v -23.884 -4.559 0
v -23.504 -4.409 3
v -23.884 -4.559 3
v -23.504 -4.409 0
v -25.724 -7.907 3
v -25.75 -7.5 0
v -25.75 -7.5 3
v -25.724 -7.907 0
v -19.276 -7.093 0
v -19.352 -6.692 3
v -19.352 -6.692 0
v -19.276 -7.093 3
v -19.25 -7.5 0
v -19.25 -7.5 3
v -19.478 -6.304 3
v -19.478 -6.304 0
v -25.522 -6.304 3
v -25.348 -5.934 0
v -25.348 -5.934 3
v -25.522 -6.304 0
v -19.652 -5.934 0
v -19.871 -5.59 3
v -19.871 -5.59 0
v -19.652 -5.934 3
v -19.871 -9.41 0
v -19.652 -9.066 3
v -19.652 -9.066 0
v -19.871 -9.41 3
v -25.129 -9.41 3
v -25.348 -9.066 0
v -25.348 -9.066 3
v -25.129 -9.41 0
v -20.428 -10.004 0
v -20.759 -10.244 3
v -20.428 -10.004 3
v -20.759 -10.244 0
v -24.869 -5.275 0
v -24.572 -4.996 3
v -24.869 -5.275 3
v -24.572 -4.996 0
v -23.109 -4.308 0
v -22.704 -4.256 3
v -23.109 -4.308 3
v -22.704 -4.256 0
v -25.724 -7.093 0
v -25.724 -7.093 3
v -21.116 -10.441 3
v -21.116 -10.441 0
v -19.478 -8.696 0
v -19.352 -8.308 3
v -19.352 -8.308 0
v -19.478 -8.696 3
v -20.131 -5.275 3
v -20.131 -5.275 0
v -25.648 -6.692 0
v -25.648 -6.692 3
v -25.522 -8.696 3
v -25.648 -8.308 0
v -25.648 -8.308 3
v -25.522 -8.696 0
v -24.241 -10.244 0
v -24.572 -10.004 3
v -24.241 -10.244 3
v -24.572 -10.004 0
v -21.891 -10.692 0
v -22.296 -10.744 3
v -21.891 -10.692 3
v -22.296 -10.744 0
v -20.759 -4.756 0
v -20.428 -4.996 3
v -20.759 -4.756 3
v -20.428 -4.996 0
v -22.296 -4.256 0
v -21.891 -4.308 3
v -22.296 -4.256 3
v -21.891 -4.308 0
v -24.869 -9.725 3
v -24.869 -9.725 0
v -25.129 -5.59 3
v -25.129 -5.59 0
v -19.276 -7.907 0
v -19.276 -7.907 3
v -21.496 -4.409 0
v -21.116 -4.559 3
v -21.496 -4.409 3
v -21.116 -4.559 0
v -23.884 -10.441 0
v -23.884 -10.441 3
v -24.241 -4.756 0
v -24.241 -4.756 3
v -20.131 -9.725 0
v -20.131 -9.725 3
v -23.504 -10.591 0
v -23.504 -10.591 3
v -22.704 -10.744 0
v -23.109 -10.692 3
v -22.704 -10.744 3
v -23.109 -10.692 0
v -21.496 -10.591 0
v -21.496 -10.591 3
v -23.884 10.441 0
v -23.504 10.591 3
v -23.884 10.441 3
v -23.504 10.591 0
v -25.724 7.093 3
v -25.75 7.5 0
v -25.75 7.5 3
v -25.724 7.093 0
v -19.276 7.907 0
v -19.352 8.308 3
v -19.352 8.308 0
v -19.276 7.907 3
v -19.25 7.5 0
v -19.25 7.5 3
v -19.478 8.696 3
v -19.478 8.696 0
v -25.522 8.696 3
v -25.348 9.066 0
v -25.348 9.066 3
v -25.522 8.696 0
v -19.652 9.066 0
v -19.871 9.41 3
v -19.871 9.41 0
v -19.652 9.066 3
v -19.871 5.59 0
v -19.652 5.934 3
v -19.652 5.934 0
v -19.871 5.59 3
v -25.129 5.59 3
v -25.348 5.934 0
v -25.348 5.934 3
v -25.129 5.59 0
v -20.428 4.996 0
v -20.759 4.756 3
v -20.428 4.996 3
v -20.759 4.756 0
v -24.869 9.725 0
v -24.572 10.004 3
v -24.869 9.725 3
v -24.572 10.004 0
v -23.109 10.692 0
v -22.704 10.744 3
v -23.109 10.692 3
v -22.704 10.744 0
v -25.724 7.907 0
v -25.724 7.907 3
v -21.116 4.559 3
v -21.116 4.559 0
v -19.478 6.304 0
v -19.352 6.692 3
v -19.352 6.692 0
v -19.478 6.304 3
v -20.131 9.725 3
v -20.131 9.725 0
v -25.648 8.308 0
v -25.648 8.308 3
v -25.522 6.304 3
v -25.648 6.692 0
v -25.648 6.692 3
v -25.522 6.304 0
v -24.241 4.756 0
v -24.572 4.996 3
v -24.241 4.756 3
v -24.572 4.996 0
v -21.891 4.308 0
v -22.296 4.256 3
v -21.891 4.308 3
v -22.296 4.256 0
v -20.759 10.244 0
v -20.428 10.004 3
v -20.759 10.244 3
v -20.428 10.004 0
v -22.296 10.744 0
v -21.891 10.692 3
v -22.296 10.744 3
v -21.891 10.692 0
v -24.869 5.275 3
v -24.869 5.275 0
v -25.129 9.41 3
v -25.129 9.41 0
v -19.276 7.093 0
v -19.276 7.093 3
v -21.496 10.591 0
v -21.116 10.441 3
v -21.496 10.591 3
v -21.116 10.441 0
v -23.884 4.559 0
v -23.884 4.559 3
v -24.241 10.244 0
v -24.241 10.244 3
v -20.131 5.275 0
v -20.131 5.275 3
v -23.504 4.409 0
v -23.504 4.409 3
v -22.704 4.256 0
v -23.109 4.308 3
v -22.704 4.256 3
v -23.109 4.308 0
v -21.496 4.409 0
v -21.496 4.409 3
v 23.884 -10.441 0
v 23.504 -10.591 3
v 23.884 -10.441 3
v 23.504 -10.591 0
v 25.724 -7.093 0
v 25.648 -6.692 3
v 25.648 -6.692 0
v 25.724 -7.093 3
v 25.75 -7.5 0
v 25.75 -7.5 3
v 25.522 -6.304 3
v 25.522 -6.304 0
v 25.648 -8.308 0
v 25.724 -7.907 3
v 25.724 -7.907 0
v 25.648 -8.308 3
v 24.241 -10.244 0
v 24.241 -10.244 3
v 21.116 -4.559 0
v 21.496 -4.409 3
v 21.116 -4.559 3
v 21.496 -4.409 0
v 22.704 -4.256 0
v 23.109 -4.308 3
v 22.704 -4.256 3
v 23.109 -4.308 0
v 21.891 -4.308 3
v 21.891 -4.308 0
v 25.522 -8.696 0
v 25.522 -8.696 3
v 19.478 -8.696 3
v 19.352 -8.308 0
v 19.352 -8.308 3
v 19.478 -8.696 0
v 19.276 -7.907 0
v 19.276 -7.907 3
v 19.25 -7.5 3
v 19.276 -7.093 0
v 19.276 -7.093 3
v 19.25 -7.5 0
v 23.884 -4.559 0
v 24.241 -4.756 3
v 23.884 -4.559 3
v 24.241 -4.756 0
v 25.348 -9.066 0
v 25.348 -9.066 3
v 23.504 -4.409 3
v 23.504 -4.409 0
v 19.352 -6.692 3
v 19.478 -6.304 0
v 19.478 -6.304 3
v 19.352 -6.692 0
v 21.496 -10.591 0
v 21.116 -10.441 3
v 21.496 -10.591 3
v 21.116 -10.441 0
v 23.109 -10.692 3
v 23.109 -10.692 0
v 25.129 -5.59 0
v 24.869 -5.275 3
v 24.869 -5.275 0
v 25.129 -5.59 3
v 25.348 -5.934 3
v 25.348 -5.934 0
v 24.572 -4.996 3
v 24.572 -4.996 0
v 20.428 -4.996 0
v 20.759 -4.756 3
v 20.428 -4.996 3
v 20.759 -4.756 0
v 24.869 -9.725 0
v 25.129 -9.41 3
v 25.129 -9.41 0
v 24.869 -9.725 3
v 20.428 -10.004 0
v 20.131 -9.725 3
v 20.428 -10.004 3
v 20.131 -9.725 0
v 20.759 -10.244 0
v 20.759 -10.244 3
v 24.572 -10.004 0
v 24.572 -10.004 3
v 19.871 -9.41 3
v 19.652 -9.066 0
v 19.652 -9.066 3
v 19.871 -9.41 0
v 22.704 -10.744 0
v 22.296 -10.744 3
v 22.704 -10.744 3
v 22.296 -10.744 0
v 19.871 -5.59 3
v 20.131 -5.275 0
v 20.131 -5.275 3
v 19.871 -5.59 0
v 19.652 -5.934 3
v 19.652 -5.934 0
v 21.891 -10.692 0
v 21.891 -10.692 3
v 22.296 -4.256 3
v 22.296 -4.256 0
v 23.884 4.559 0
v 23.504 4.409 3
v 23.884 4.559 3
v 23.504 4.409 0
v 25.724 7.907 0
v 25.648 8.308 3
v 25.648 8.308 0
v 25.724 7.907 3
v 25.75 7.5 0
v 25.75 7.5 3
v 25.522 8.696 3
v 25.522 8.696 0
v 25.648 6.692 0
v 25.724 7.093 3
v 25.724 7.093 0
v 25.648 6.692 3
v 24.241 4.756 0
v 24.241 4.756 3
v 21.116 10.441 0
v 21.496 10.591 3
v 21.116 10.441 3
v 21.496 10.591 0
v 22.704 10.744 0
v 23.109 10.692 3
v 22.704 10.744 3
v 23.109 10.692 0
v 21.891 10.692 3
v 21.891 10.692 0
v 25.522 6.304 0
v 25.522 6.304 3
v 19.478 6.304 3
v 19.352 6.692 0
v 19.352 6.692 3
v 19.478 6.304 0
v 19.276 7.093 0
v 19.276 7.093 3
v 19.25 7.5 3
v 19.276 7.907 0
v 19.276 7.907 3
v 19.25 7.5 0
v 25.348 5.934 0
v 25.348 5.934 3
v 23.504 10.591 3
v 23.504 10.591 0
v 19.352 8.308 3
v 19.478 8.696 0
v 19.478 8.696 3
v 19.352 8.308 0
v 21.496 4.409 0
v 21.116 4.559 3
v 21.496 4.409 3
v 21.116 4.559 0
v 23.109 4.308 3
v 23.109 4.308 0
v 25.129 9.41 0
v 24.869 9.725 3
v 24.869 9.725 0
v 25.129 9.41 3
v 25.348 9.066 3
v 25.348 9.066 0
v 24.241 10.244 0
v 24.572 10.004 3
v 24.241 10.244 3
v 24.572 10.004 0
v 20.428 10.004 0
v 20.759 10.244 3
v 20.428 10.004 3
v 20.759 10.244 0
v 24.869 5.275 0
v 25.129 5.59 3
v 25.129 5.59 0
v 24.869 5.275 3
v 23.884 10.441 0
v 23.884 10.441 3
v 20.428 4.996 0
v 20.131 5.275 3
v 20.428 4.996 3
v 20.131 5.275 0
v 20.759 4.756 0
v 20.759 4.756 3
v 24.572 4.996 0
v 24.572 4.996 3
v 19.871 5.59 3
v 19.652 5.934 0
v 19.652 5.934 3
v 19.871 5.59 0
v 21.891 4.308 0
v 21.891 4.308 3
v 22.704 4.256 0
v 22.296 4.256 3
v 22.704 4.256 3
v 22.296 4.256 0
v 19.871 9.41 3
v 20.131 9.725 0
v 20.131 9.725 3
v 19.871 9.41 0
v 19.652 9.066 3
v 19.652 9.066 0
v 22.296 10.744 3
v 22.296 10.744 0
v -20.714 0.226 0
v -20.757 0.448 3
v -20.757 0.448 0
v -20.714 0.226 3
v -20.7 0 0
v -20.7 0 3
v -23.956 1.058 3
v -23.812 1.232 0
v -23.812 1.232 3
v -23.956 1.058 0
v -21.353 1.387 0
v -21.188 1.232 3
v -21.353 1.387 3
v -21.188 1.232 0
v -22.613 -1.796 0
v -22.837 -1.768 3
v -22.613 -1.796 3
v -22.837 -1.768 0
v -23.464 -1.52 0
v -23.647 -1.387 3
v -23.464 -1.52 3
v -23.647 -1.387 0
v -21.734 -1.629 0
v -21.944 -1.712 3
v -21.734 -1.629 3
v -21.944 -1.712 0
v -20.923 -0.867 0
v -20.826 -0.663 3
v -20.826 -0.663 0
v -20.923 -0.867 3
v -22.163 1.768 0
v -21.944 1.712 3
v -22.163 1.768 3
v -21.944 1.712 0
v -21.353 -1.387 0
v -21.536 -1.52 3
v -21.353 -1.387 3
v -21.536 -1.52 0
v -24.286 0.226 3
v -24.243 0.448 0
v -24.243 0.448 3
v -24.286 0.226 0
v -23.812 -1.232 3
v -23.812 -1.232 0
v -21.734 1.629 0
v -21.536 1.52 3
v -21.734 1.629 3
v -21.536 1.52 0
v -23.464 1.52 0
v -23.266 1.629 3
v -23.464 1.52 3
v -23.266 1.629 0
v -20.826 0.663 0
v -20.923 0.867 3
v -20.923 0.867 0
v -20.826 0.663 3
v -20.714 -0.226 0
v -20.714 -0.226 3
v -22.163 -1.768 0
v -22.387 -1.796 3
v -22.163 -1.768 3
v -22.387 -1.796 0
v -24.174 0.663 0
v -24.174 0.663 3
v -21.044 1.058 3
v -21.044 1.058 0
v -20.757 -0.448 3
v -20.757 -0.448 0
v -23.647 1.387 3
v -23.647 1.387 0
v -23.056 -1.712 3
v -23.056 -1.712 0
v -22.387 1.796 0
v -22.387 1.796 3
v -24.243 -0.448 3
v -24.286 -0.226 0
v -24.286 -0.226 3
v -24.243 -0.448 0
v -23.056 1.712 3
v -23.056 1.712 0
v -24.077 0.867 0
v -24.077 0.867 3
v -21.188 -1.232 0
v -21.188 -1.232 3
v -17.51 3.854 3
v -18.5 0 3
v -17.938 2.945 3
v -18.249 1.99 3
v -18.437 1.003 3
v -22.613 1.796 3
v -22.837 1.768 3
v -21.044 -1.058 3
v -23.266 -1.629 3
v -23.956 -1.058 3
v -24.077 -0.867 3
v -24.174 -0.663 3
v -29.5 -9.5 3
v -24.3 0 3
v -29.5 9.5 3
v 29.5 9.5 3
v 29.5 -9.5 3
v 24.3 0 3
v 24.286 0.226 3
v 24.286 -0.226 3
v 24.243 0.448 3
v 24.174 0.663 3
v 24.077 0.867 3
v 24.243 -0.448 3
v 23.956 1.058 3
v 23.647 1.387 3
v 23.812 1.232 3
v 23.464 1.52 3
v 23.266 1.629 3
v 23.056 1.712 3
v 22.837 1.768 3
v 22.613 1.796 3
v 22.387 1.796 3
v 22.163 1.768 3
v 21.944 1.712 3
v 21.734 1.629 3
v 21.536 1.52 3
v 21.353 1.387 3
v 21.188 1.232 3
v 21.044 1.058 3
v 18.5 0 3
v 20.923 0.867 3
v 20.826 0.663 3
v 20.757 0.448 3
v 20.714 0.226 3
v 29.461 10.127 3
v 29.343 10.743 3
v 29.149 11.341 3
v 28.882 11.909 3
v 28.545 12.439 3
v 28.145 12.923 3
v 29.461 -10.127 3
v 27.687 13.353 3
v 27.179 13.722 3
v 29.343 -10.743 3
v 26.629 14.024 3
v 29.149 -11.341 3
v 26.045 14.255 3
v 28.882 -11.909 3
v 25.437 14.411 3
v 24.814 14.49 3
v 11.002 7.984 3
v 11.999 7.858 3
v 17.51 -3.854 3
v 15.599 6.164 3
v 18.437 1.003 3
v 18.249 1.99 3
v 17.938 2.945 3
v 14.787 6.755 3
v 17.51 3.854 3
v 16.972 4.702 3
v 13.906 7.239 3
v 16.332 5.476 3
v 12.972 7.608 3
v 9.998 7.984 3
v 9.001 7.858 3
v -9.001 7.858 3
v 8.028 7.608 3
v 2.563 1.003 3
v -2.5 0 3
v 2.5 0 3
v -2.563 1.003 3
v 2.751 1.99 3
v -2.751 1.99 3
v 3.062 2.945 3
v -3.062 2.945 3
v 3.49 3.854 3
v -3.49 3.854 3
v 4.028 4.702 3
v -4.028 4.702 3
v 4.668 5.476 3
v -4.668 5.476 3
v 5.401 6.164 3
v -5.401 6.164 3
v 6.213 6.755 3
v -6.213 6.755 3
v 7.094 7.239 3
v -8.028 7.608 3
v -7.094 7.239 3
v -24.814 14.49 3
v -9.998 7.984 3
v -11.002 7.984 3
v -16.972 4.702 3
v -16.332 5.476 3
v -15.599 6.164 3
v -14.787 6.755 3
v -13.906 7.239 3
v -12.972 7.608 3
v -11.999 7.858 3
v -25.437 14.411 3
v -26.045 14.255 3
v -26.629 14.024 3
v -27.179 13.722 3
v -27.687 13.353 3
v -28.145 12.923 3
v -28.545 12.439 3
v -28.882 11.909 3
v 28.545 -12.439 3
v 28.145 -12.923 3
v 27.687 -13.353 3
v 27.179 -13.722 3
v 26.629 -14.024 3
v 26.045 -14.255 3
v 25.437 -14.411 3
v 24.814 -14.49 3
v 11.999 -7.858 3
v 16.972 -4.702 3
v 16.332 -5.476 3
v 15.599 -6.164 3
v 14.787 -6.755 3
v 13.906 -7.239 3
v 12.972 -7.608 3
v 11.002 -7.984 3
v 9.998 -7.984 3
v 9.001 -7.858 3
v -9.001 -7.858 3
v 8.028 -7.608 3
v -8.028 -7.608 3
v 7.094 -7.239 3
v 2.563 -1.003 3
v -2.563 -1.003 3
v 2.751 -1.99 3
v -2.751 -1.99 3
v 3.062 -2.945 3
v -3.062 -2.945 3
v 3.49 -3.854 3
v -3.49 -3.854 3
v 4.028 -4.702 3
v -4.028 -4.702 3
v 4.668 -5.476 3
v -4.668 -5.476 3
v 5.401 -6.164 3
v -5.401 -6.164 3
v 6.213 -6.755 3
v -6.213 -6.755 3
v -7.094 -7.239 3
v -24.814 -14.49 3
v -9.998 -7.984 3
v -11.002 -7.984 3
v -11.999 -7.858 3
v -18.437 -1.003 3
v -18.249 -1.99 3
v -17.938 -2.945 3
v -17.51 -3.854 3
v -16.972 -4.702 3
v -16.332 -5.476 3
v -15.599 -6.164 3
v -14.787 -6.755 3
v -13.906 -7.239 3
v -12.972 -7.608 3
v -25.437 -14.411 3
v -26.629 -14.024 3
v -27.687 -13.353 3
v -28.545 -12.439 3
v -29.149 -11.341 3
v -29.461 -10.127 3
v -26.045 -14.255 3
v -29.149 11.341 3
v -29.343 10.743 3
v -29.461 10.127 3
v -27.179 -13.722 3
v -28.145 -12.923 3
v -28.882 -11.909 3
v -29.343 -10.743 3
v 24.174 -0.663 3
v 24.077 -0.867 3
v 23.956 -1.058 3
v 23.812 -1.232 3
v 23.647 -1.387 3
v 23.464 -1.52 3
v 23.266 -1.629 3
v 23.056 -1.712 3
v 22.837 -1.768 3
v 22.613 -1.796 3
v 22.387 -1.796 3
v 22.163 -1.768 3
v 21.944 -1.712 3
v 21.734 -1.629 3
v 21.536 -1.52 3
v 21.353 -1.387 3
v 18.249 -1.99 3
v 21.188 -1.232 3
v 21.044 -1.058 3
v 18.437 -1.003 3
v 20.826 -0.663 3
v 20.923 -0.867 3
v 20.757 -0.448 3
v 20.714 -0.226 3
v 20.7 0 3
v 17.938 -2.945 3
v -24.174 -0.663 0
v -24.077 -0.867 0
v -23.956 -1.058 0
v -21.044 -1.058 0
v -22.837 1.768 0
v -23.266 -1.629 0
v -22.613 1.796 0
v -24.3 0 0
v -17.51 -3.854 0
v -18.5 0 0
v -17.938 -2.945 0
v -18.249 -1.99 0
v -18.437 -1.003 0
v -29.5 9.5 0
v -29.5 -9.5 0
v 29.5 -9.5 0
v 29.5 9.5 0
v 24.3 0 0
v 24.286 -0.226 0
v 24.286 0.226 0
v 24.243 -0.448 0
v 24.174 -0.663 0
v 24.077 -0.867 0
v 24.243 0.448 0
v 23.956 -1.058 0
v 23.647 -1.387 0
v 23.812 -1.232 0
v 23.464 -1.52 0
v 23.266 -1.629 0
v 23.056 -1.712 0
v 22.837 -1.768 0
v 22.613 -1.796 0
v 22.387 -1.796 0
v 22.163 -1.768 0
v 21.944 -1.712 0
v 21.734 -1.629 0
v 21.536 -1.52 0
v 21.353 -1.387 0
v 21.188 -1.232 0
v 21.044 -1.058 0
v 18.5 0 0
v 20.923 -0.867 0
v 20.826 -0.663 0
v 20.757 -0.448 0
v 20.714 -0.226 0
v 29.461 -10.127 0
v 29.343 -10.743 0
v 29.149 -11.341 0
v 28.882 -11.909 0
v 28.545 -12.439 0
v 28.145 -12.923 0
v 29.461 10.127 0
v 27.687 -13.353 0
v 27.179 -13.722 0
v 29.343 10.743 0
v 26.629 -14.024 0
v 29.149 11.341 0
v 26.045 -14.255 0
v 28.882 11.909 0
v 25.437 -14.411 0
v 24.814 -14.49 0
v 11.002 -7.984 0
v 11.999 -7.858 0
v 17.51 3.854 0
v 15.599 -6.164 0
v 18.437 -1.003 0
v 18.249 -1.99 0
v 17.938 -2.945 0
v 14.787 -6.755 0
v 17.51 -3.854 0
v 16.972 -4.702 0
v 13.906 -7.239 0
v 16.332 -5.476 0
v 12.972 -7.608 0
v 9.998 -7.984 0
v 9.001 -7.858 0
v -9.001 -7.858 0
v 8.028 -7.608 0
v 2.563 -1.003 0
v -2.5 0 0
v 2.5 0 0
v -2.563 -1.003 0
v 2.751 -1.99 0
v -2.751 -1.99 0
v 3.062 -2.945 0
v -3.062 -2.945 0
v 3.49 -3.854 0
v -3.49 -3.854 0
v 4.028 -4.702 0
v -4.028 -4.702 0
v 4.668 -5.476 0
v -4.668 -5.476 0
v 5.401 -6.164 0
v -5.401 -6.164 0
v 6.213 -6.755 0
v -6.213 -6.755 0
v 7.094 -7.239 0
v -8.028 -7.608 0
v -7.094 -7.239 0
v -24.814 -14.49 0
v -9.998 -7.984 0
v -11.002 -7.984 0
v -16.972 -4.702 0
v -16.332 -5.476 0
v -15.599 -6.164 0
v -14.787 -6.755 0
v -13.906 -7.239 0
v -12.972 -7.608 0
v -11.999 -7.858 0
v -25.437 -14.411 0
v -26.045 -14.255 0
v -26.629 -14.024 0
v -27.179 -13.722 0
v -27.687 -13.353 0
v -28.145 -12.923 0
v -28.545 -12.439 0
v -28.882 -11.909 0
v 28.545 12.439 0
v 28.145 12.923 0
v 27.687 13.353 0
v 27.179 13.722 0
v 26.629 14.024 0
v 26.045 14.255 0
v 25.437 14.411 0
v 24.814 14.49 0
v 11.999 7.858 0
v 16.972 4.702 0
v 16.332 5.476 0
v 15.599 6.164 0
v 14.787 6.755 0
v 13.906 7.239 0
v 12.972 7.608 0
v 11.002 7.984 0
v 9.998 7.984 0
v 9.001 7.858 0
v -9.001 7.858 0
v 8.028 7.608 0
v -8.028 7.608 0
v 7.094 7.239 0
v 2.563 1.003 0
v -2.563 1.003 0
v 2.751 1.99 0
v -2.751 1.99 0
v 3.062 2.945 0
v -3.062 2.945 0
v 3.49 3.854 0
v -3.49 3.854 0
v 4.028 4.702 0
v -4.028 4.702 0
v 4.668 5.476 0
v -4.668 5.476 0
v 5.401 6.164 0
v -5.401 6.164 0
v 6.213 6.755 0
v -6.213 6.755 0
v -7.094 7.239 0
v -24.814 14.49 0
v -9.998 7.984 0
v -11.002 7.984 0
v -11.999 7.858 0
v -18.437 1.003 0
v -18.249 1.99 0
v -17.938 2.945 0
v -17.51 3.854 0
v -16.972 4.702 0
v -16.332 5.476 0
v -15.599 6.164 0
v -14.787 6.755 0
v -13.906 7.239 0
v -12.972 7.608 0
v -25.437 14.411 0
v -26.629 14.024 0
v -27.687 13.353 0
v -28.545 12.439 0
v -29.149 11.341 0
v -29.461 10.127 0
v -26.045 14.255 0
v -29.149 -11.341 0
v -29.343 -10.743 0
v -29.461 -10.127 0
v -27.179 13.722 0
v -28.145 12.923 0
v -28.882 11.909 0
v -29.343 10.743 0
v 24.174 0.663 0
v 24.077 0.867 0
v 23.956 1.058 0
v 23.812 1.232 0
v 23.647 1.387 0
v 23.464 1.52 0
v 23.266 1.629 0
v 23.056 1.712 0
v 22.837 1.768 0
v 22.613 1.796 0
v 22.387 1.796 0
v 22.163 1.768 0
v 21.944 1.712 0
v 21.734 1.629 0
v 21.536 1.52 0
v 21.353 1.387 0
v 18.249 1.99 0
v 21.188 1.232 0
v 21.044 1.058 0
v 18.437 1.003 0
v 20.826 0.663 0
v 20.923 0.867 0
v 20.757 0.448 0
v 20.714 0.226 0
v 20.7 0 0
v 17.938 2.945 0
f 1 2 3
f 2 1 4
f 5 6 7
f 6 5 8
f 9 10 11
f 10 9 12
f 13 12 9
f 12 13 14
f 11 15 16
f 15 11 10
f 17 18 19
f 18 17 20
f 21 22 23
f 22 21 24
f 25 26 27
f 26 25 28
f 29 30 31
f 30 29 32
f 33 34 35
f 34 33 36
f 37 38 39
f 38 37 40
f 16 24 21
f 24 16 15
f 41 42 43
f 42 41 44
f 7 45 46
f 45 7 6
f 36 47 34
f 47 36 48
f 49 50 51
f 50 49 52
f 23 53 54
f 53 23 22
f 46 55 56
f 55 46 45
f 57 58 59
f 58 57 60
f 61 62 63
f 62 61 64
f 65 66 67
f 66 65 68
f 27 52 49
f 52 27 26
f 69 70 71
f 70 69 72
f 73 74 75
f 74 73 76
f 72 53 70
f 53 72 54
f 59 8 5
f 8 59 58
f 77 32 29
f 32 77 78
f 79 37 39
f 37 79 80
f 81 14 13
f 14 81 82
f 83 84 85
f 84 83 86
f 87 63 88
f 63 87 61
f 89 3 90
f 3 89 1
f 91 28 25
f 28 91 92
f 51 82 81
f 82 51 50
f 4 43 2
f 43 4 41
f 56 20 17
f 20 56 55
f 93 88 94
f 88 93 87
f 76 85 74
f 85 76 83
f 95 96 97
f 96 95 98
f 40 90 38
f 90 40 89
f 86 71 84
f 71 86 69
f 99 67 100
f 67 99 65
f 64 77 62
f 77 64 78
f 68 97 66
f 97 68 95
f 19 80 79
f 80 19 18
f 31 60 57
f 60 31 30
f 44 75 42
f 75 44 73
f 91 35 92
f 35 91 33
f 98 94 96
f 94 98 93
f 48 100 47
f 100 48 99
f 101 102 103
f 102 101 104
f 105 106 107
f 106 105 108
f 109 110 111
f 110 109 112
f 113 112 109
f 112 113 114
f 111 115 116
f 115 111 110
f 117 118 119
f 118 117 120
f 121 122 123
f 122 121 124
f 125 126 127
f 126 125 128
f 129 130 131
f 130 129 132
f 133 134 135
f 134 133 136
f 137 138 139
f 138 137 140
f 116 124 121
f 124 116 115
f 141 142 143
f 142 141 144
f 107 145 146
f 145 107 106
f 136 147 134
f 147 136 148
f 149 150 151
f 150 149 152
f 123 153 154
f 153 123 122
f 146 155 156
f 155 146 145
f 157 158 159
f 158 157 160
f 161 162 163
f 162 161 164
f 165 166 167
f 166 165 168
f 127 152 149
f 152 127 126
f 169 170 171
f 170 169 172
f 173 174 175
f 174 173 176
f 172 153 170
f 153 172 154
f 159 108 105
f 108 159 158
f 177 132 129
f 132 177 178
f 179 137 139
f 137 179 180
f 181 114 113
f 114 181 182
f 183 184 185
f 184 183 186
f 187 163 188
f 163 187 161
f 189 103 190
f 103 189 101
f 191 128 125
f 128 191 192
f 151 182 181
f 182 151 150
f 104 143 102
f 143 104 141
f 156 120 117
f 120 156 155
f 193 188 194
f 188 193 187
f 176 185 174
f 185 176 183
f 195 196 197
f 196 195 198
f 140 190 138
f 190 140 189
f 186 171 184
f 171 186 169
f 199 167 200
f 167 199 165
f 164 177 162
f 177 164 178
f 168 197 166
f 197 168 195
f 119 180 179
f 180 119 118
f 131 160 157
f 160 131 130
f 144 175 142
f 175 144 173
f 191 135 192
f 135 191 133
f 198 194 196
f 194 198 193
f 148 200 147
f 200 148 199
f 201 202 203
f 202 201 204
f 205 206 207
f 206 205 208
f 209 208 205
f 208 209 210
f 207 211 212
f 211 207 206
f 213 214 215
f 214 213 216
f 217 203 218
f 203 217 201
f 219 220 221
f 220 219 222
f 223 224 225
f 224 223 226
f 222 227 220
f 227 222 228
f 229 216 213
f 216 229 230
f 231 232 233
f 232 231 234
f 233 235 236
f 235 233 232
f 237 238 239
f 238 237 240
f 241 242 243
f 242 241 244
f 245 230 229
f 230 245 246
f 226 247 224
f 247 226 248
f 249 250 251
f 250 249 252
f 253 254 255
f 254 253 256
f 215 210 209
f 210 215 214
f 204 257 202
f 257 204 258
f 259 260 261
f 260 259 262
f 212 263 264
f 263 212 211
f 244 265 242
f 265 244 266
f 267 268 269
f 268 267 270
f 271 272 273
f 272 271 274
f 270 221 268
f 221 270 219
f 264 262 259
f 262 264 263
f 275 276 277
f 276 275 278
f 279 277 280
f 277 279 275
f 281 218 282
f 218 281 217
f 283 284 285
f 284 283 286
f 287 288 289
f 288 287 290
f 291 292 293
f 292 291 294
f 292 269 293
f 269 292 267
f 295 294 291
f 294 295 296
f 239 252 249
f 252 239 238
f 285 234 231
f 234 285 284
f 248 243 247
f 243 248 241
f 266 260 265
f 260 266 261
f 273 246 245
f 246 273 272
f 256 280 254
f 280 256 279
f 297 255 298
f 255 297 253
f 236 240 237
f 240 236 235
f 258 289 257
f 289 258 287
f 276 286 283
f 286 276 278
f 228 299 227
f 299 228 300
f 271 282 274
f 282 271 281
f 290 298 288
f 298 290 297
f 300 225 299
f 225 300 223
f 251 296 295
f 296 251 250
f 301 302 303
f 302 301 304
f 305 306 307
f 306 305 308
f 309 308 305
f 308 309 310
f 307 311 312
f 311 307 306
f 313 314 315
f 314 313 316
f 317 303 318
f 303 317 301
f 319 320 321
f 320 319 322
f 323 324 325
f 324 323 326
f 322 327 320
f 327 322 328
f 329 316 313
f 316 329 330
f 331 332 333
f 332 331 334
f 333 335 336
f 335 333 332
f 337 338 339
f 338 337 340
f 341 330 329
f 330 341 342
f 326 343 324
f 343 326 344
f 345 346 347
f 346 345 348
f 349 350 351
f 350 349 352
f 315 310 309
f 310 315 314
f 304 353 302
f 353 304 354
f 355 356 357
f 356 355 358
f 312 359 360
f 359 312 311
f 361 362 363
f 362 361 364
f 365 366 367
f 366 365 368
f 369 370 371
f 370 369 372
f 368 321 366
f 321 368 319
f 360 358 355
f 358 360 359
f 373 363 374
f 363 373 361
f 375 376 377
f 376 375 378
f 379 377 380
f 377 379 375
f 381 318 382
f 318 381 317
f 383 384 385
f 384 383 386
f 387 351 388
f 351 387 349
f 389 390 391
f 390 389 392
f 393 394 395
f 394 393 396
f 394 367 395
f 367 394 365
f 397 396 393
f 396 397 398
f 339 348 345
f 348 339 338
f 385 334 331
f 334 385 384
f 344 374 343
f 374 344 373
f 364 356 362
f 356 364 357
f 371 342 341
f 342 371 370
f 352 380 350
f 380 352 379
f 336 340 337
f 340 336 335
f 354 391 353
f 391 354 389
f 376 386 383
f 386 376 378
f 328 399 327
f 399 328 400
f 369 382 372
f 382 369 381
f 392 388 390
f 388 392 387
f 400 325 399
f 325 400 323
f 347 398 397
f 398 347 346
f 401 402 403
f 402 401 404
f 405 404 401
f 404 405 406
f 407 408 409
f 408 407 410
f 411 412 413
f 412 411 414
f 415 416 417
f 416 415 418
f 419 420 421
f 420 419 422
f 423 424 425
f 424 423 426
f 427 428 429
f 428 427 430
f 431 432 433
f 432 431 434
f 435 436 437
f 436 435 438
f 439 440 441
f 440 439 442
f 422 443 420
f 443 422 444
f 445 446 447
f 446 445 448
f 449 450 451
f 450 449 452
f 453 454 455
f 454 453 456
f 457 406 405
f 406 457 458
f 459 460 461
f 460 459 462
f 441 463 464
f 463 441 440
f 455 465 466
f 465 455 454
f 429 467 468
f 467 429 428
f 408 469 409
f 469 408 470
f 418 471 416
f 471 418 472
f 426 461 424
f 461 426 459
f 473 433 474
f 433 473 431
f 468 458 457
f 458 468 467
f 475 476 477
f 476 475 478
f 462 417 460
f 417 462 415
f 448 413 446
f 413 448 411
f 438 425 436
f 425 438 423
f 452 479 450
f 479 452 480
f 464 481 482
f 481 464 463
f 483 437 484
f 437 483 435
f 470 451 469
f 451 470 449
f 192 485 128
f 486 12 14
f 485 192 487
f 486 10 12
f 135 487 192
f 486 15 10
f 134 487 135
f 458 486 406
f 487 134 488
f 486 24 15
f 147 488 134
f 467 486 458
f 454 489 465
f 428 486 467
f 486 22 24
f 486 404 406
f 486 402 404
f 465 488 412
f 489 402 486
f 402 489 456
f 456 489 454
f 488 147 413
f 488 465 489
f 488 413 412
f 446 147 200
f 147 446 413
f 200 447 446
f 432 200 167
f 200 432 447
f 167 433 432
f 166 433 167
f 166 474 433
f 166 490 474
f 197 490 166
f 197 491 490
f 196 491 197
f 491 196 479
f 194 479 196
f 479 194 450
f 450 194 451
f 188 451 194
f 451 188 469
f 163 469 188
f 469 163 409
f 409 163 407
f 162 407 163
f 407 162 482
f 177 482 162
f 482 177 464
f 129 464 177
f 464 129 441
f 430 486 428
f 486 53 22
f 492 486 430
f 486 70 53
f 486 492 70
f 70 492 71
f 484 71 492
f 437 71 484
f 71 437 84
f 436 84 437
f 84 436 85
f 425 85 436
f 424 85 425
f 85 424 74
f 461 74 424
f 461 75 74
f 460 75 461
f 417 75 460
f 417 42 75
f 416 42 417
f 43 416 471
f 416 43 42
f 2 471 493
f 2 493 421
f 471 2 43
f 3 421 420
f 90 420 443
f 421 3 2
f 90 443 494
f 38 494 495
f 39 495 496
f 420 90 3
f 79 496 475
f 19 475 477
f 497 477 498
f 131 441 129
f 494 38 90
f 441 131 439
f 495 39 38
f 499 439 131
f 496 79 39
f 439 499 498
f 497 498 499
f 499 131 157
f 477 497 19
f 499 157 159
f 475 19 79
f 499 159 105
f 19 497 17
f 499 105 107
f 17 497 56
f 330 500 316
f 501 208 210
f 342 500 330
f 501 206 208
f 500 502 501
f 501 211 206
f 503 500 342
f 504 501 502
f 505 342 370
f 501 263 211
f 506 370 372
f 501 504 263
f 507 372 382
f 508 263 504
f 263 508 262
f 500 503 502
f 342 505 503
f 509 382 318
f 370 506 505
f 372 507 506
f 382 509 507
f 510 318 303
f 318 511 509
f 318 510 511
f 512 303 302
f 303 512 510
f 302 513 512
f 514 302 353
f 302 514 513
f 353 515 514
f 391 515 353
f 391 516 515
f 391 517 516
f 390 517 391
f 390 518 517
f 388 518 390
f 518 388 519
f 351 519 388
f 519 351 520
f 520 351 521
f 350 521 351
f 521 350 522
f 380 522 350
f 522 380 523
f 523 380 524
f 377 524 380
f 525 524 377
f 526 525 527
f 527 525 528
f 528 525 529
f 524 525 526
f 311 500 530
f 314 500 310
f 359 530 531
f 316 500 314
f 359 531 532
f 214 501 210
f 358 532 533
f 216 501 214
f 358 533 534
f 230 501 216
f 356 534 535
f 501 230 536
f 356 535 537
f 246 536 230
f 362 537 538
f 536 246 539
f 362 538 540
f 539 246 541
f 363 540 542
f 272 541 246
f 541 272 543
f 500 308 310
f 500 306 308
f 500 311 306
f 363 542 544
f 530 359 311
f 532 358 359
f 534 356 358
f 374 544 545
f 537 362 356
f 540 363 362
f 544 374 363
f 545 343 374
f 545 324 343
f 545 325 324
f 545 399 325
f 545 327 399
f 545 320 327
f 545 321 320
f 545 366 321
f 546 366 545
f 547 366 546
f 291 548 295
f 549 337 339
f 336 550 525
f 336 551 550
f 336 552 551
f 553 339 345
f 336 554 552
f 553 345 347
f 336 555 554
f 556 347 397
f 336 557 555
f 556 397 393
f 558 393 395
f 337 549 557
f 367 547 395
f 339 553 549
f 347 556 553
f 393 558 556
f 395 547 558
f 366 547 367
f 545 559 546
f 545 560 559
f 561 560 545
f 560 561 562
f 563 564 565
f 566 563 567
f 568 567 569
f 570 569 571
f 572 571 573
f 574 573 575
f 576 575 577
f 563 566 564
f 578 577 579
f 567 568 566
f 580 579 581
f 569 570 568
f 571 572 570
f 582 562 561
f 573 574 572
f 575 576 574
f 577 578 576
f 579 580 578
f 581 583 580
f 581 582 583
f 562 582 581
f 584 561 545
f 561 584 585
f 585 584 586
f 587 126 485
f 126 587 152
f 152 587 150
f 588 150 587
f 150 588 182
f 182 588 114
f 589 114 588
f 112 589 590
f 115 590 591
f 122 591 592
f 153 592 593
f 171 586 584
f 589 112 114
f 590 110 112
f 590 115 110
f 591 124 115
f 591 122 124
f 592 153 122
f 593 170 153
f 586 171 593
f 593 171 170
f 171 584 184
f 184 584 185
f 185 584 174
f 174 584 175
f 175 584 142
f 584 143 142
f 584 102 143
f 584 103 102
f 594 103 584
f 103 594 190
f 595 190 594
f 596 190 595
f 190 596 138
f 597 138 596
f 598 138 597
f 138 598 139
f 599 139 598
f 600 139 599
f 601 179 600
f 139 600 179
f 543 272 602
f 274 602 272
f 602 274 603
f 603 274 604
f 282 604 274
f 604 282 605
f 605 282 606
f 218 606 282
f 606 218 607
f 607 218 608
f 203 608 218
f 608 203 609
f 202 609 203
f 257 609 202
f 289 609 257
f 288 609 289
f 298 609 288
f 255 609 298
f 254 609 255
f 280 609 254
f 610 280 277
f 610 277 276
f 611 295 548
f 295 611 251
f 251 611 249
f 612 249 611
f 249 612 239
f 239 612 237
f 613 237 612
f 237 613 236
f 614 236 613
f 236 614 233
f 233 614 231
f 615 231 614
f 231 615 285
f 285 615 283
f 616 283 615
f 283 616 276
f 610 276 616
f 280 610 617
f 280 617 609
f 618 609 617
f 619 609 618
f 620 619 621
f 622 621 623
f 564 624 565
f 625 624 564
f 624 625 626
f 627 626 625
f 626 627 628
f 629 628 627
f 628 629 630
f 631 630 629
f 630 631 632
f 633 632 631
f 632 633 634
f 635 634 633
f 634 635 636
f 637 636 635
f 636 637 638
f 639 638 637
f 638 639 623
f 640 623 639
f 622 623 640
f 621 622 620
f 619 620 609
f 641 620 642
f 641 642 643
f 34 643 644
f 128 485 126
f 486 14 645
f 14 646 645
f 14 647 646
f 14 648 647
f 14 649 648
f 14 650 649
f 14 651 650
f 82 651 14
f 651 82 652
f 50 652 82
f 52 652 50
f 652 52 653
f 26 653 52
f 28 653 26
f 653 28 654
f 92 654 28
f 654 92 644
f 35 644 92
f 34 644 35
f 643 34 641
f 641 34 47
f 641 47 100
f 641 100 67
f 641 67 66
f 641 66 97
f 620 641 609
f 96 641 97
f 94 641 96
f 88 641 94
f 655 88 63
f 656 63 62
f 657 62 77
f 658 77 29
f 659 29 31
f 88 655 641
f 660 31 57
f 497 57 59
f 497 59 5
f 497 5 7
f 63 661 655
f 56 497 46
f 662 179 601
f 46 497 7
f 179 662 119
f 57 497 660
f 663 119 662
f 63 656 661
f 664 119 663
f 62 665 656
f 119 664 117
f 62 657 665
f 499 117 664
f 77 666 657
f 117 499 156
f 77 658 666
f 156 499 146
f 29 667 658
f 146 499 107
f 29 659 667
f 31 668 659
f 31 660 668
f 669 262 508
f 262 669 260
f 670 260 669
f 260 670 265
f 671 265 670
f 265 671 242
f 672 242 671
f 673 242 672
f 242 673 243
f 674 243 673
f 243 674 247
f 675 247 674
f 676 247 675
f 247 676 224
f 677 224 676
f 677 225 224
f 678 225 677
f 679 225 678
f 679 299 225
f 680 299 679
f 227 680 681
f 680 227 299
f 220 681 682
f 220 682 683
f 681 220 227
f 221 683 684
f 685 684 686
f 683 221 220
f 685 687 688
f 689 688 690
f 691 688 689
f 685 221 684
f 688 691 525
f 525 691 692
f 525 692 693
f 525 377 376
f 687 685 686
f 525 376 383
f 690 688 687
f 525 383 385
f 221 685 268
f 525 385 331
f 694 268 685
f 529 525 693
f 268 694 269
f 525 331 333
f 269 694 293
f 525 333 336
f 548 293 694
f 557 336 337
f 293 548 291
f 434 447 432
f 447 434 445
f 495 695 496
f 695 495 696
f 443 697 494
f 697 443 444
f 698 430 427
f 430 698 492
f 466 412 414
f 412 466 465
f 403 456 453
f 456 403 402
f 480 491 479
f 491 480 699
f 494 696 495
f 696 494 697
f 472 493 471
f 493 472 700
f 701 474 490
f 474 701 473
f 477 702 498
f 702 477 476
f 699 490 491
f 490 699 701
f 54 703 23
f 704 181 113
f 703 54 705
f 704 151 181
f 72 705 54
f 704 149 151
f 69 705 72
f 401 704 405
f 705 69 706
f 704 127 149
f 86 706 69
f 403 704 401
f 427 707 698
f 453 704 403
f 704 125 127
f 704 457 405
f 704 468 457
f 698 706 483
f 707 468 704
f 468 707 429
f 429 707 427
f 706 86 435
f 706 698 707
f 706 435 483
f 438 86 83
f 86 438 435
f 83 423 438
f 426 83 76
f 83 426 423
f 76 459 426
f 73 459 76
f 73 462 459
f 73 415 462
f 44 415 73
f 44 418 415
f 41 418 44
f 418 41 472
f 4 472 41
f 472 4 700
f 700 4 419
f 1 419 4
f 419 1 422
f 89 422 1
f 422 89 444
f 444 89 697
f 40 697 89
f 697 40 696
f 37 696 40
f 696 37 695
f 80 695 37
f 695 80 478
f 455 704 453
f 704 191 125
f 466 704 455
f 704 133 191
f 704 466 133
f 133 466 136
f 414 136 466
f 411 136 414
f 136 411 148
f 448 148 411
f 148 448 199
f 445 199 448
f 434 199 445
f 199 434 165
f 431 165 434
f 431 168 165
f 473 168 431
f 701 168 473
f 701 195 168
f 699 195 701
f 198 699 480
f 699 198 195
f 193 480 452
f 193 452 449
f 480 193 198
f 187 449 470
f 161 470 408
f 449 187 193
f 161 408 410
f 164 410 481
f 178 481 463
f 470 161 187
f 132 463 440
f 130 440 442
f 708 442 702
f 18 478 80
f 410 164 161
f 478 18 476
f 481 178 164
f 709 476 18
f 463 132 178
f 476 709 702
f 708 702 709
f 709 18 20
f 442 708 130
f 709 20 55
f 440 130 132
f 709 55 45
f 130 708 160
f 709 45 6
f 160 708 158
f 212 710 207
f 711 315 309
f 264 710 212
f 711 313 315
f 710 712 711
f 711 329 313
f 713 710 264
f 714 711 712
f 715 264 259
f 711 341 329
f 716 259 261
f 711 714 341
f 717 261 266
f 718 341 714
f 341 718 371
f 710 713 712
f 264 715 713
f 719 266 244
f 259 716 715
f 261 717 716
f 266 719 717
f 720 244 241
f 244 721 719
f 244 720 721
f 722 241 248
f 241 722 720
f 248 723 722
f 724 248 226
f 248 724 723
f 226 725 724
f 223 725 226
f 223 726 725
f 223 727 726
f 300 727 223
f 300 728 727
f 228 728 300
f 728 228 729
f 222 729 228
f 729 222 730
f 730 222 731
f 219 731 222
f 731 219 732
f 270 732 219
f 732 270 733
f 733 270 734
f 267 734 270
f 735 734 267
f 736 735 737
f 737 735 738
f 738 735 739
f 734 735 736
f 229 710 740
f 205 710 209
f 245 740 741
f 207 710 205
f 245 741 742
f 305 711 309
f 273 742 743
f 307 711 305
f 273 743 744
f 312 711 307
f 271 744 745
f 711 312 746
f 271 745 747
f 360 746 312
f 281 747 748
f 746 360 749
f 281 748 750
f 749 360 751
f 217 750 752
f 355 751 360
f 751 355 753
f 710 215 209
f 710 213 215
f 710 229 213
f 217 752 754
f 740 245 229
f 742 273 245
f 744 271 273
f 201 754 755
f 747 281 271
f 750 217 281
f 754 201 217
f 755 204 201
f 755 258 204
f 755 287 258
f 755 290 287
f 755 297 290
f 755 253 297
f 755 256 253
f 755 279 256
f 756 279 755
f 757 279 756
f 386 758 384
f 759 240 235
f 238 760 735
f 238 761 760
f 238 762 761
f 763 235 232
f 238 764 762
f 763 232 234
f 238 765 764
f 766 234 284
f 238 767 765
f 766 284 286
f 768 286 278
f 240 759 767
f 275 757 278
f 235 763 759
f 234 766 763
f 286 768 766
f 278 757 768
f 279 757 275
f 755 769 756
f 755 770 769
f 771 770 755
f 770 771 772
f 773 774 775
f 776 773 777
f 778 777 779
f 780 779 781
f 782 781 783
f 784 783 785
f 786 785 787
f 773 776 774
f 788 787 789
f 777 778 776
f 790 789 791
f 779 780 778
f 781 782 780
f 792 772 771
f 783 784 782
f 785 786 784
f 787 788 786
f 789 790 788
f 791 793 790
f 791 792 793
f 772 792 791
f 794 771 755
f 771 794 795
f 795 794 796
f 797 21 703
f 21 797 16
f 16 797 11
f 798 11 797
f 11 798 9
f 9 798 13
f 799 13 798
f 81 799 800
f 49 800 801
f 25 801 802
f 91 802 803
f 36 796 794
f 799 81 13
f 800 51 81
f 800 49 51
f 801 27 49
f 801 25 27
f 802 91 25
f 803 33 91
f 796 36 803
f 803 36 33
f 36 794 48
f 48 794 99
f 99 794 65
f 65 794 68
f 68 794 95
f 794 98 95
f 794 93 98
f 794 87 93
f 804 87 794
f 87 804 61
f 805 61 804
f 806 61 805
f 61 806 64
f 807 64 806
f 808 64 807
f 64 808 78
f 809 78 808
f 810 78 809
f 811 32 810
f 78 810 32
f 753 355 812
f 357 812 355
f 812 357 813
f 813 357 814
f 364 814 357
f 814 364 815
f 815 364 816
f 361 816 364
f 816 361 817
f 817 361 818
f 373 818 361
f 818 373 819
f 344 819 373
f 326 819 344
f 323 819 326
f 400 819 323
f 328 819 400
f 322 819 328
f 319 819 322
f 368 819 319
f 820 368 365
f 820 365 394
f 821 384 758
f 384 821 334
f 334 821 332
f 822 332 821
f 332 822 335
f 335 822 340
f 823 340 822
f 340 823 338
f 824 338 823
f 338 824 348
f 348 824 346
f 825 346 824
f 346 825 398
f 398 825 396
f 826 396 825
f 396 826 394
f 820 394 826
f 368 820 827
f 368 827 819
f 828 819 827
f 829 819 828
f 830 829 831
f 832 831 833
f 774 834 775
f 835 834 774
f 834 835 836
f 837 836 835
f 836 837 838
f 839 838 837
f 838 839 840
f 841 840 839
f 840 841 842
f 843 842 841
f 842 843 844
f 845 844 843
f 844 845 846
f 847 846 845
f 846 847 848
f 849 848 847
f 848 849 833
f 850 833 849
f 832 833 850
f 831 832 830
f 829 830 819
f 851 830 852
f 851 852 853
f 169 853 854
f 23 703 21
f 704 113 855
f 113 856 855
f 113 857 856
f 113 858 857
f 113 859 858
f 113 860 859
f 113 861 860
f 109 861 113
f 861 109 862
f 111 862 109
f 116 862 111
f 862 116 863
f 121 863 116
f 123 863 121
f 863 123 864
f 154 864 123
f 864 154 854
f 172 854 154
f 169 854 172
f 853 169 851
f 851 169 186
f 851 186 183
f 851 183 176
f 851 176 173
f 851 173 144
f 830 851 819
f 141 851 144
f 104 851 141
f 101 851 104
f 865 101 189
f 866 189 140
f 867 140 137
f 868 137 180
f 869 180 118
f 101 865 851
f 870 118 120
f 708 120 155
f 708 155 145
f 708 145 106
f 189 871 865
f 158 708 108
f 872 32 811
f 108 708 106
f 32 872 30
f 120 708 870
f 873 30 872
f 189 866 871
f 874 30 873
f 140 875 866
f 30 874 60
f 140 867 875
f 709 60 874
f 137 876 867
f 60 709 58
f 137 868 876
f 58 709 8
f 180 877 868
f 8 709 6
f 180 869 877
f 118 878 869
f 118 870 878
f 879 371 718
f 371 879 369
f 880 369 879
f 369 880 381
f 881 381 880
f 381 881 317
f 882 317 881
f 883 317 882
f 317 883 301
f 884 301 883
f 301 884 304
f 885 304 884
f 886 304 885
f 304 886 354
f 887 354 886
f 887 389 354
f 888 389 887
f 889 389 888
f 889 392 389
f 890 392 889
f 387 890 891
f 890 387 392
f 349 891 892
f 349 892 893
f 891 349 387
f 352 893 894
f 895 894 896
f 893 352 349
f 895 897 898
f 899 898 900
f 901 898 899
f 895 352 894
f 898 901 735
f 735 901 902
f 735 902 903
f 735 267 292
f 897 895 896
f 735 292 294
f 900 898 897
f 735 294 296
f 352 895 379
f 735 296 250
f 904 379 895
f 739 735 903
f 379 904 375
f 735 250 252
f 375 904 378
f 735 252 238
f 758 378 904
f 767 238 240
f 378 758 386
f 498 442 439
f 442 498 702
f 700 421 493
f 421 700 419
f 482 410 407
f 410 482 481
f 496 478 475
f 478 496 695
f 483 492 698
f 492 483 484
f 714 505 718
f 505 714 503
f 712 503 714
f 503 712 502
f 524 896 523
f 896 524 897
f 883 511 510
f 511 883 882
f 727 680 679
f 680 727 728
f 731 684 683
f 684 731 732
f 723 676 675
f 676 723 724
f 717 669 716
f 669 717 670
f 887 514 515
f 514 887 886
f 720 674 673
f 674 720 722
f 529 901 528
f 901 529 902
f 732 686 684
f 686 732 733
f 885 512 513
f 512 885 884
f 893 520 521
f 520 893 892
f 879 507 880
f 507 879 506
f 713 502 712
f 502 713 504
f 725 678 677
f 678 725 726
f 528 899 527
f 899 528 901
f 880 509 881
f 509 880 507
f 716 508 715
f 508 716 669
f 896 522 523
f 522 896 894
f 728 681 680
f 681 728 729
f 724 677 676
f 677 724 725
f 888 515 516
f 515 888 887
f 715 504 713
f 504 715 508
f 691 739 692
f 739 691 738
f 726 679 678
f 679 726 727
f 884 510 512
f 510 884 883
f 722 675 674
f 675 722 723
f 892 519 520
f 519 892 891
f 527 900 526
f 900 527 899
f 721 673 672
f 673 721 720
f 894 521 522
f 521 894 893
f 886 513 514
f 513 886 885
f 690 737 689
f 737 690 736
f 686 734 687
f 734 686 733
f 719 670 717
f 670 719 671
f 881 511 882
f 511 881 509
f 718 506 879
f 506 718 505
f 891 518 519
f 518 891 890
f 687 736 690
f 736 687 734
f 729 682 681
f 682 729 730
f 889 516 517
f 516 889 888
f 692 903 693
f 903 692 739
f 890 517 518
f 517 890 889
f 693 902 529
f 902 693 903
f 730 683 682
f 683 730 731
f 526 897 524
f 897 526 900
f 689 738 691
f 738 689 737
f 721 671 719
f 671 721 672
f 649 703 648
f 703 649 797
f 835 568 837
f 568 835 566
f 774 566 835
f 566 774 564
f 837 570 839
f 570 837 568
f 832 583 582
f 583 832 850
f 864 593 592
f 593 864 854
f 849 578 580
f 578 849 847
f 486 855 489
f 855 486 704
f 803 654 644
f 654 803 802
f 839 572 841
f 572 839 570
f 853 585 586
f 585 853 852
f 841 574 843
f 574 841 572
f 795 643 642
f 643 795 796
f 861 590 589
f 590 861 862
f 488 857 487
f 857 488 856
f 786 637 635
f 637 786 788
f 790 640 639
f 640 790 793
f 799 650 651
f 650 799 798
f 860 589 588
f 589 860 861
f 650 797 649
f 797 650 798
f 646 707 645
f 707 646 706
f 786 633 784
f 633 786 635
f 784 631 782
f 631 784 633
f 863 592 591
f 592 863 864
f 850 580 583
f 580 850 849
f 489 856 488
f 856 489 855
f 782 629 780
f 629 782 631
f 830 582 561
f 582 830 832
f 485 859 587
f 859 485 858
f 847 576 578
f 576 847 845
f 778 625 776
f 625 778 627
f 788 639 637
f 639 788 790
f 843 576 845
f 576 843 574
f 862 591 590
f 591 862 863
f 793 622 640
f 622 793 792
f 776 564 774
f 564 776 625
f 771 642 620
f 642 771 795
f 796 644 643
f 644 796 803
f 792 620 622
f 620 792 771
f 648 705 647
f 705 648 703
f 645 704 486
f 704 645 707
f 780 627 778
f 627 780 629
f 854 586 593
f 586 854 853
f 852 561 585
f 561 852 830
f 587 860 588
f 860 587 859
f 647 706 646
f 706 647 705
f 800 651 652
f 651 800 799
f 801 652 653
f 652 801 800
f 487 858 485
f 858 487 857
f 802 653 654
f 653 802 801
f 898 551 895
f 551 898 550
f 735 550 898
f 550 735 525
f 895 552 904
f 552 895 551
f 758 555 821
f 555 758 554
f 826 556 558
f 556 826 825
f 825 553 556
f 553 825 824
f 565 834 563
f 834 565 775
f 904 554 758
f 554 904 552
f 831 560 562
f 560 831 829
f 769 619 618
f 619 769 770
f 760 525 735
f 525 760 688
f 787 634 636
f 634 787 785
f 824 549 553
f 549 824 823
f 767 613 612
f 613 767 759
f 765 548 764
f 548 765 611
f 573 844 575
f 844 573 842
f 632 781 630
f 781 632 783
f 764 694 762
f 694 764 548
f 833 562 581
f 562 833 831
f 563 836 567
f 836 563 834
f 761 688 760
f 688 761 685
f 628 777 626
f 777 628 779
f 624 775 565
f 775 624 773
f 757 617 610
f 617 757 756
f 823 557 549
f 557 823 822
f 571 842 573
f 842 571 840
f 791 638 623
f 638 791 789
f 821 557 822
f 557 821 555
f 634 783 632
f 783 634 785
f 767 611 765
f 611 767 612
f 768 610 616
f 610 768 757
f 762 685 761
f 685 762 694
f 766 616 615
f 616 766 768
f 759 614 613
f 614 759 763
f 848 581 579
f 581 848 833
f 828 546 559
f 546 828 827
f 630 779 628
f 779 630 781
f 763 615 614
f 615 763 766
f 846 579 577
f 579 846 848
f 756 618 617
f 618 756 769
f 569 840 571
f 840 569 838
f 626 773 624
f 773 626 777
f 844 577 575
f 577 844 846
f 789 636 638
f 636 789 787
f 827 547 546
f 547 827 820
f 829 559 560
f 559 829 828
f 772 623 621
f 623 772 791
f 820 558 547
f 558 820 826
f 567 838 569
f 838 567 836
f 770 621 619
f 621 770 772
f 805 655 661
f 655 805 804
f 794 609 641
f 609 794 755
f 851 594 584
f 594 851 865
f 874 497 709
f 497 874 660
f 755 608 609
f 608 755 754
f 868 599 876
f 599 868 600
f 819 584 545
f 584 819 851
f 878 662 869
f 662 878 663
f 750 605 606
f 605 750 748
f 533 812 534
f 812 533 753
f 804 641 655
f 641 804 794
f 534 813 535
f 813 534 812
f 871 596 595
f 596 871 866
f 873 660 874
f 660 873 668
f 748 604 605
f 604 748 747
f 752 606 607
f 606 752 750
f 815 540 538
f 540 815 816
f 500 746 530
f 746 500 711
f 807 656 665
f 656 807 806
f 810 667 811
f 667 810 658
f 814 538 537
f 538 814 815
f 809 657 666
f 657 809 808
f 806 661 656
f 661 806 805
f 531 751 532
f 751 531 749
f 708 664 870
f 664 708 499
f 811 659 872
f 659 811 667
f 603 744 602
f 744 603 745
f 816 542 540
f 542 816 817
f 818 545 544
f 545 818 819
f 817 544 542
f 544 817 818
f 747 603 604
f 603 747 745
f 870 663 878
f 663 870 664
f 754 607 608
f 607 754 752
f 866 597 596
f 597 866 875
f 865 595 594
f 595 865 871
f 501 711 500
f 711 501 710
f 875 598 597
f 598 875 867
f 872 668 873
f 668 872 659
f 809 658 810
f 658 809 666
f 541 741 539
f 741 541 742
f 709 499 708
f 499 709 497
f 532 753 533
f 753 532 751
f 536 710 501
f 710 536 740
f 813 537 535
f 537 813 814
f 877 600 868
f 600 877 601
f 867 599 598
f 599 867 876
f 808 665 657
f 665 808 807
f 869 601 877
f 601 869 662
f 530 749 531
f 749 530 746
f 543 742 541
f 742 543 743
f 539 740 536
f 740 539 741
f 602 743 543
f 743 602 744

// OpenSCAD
$fn = 50;


difference() {
	union() {
		hull() {
			translate(v = [-24.5000000000, 9.5000000000, 0]) {
				cylinder(h = 3, r = 5);
			}
			translate(v = [24.5000000000, 9.5000000000, 0]) {
				cylinder(h = 3, r = 5);
			}
			translate(v = [-24.5000000000, -9.5000000000, 0]) {
				cylinder(h = 3, r = 5);
			}
			translate(v = [24.5000000000, -9.5000000000, 0]) {
				cylinder(h = 3, r = 5);
			}
		}
	}
	union() {
		#translate(v = [-22.5000000000, -7.5000000000, 0]) {
			cylinder(h = 3, r = 3.2500000000);
		}
		#translate(v = [-22.5000000000, 7.5000000000, 0]) {
			cylinder(h = 3, r = 3.2500000000);
		}
		#translate(v = [22.5000000000, -7.5000000000, 0]) {
			cylinder(h = 3, r = 3.2500000000);
		}
		#translate(v = [22.5000000000, 7.5000000000, 0]) {
			cylinder(h = 3, r = 3.2500000000);
		}
		#translate(v = [-22.5000000000, -7.5000000000, -100.0000000000]) {
			cylinder(h = 200, r = 3.2500000000);
		}
		#translate(v = [-22.5000000000, 7.5000000000, -100.0000000000]) {
			cylinder(h = 200, r = 3.2500000000);
		}
		#translate(v = [22.5000000000, -7.5000000000, -100.0000000000]) {
			cylinder(h = 200, r = 3.2500000000);
		}
		#translate(v = [22.5000000000, 7.5000000000, -100.0000000000]) {
			cylinder(h = 200, r = 3.2500000000);
		}
		#translate(v = [-22.5000000000, -7.5000000000, 0]) {
			cylinder(h = 3, r = 1.8000000000);
		}
		#translate(v = [-22.5000000000, 0.0000000000, 0]) {
			cylinder(h = 3, r = 1.8000000000);
		}
		#translate(v = [-22.5000000000, 7.5000000000, 0]) {
			cylinder(h = 3, r = 1.8000000000);
		}
		#translate(v = [22.5000000000, -7.5000000000, 0]) {
			cylinder(h = 3, r = 1.8000000000);
		}
		#translate(v = [22.5000000000, 0.0000000000, 0]) {
			cylinder(h = 3, r = 1.8000000000);
		}
		#translate(v = [22.5000000000, 7.5000000000, 0]) {
			cylinder(h = 3, r = 1.8000000000);
		}
		#translate(v = [-22.5000000000, -7.5000000000, 0]) {
			cylinder(h = 3, r = 1.8000000000);
		}
		#translate(v = [-22.5000000000, 0.0000000000, 0]) {
			cylinder(h = 3, r = 1.8000000000);
		}
		#translate(v = [-22.5000000000, 7.5000000000, 0]) {
			cylinder(h = 3, r = 1.8000000000);
		}
		#translate(v = [22.5000000000, -7.5000000000, 0]) {
			cylinder(h = 3, r = 1.8000000000);
		}
		#translate(v = [22.5000000000, 0.0000000000, 0]) {
			cylinder(h = 3, r = 1.8000000000);
		}
		#translate(v = [22.5000000000, 7.5000000000, 0]) {
			cylinder(h = 3, r = 1.8000000000);
		}
		#translate(v = [-22.5000000000, -7.5000000000, 0]) {
			cylinder(h = 3, r = 1.8000000000);
		}
		#translate(v = [-22.5000000000, 0.0000000000, 0]) {
			cylinder(h = 3, r = 1.8000000000);
		}
		#translate(v = [-22.5000000000, 7.5000000000, 0]) {
			cylinder(h = 3, r = 1.8000000000);
		}
		#translate(v = [22.5000000000, -7.5000000000, 0]) {
			cylinder(h = 3, r = 1.8000000000);
		}
		#translate(v = [22.5000000000, 0.0000000000, 0]) {
			cylinder(h = 3, r = 1.8000000000);
		}
		#translate(v = [22.5000000000, 7.5000000000, 0]) {
			cylinder(h = 3, r = 1.8000000000);
		}
		#translate(v = [-10.5000000000, 0, 0]) {
			cylinder(h = 3, r = 8.0000000000);
		}
		#translate(v = [10.5000000000, 0, 0]) {
			cylinder(h = 3, r = 8.0000000000);
		}
	}
}
